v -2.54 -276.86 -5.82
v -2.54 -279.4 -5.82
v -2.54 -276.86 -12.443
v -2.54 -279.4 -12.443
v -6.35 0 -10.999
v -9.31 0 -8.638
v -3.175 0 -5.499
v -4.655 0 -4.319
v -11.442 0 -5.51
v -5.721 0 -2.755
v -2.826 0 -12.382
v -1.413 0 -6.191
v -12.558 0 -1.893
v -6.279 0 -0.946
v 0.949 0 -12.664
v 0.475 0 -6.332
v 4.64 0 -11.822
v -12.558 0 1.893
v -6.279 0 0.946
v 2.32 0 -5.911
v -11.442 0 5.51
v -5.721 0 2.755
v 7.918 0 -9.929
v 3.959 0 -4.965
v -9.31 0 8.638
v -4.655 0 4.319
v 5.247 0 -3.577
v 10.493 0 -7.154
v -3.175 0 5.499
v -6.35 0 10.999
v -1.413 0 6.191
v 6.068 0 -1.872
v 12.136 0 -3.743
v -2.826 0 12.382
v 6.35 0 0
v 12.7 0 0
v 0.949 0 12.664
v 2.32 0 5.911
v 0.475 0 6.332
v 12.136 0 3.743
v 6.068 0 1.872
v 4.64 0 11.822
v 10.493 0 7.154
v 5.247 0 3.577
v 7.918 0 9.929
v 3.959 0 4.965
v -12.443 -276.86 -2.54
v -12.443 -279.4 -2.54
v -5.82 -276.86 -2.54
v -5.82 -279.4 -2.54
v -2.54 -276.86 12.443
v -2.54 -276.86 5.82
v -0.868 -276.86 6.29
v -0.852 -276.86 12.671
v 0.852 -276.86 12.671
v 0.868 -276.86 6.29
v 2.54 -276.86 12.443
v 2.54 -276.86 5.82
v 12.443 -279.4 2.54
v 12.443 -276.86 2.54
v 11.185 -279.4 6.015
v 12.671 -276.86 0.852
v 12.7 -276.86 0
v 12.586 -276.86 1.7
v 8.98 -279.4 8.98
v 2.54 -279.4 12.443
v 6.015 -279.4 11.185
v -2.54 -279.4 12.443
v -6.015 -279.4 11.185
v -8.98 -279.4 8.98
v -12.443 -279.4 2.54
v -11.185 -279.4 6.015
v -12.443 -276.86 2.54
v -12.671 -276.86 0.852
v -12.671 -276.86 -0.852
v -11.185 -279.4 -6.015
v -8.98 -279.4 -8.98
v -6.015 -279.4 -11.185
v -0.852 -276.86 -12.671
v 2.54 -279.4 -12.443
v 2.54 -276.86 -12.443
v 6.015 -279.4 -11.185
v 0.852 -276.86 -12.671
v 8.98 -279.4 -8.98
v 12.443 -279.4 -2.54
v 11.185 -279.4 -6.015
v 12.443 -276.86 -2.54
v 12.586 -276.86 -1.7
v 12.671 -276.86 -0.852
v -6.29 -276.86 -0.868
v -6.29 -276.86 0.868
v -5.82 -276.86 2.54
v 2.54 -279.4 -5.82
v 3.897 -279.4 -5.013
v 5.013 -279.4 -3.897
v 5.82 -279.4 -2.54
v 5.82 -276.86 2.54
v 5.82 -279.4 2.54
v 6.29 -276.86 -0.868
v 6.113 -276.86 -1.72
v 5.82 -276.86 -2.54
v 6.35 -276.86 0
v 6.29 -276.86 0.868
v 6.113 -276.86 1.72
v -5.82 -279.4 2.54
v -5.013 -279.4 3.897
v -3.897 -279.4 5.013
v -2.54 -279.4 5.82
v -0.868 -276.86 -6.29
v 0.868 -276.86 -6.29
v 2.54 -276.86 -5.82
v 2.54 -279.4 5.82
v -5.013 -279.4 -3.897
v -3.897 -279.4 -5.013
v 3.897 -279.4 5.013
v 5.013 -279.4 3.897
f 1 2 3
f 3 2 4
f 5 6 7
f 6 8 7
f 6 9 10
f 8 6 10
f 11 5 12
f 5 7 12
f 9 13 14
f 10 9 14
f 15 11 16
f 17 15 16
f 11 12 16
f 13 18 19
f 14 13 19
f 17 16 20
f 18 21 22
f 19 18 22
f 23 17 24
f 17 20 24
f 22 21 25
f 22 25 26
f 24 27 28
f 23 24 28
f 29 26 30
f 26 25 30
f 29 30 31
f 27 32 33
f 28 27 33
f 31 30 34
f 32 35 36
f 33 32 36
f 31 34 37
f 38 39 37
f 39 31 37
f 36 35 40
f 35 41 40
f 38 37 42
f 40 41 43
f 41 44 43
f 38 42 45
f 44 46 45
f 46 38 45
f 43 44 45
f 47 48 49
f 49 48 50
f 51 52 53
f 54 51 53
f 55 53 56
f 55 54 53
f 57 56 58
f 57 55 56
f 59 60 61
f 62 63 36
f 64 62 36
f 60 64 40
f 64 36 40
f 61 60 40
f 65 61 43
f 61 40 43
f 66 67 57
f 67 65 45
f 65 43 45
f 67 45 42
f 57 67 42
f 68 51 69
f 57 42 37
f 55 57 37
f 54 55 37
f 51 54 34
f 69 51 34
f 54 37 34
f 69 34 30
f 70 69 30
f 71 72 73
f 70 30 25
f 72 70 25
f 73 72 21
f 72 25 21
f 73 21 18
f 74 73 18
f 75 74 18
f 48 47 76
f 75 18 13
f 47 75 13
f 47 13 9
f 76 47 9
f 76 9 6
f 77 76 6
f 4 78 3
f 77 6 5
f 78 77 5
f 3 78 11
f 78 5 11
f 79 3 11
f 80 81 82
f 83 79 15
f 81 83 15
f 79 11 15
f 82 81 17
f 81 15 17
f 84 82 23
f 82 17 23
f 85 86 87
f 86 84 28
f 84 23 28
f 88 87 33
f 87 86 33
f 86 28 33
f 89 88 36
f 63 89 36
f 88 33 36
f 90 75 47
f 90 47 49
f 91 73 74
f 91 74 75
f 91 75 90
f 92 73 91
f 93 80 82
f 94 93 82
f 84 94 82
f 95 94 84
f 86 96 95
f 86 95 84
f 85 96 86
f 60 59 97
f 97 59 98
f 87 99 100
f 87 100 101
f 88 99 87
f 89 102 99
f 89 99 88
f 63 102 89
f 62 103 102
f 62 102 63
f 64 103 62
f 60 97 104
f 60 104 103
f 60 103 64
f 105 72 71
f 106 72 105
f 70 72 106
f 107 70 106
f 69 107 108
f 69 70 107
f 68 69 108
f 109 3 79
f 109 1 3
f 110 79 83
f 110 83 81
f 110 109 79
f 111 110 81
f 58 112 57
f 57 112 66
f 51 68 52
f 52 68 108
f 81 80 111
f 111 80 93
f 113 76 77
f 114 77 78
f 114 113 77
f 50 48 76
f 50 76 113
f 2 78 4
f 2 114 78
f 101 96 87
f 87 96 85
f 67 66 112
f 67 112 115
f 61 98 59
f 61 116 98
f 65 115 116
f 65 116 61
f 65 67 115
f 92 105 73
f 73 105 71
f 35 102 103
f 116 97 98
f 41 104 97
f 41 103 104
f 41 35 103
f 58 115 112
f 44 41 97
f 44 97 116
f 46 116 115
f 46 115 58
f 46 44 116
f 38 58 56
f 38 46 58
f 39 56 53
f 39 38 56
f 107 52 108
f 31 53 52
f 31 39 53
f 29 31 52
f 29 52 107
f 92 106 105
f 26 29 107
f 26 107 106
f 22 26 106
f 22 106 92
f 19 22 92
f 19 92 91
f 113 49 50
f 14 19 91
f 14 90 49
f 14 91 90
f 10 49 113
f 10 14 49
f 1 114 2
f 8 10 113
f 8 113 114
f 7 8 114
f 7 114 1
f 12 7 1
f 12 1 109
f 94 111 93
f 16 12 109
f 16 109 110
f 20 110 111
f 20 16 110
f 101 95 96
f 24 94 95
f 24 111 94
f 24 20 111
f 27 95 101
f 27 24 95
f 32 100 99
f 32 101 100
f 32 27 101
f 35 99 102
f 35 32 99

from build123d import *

# Parameters (mm, degrees)
F0_R     = 12.7
F0_R_2   = 6.35
F1_DEPTH = 279.4
F3_DEPTH = 2.54


with BuildPart() as f1:
    # F0 (on Front) → F1 (new body)
    with BuildSketch(Plane.XZ):
        Circle(F0_R)
        Circle(F0_R_2, mode=Mode.SUBTRACT)
    extrude(amount=F1_DEPTH)

    # F2 (on face) → F3 (cut)
    with BuildSketch(Plane.XZ.offset(279.4)):
        with BuildLine():
            Line((2.54, 5.8198711326), (2.54, 12.4434078933))
            ThreePointArc((2.54, 12.4434078933), (0, 12.7), (-2.54, 12.4434078933))
            Line((-2.54, 12.4434078933), (-2.54, 5.8198711326))
            ThreePointArc((-2.54, 5.8198711326), (0, 6.35), (2.54, 5.8198711326))
        make_face()
        with BuildLine():
            Line((-5.8198711326, 2.54), (-12.4434078933, 2.54))
            ThreePointArc((-12.4434078933, 2.54), (-12.7, 0), (-12.4434078933, -2.54))
            Line((-12.4434078933, -2.54), (-5.8198711326, -2.54))
            ThreePointArc((-5.8198711326, -2.54), (-6.35, 0), (-5.8198711326, 2.54))
        make_face()
        with BuildLine():
            ThreePointArc((-2.54, -12.4434078933), (0, -12.7), (2.54, -12.4434078933))
            Line((2.54, -12.4434078933), (2.54, -5.8198711326))
            ThreePointArc((2.54, -5.8198711326), (0, -6.35), (-2.54, -5.8198711326))
            Line((-2.54, -5.8198711326), (-2.54, -12.4434078933))
        make_face()
        with BuildLine():
            ThreePointArc((12.4434078933, -2.54), (12.6356891432, -1.2764638175), (12.7, 0))
            ThreePointArc((12.7, 0), (12.6356891432, 1.2764638175), (12.4434078933, 2.54))
            Line((12.4434078933, 2.54), (5.8198711326, 2.54))
            ThreePointArc((5.8198711326, 2.54), (6.2160550871, 1.2973662374), (6.35, 0))
            ThreePointArc((6.35, 0), (6.2160550871, -1.2973662374), (5.8198711326, -2.54))
            Line((5.8198711326, -2.54), (12.4434078933, -2.54))
        make_face()
    extrude(amount=-F3_DEPTH, mode=Mode.SUBTRACT)


solid = f1.part
